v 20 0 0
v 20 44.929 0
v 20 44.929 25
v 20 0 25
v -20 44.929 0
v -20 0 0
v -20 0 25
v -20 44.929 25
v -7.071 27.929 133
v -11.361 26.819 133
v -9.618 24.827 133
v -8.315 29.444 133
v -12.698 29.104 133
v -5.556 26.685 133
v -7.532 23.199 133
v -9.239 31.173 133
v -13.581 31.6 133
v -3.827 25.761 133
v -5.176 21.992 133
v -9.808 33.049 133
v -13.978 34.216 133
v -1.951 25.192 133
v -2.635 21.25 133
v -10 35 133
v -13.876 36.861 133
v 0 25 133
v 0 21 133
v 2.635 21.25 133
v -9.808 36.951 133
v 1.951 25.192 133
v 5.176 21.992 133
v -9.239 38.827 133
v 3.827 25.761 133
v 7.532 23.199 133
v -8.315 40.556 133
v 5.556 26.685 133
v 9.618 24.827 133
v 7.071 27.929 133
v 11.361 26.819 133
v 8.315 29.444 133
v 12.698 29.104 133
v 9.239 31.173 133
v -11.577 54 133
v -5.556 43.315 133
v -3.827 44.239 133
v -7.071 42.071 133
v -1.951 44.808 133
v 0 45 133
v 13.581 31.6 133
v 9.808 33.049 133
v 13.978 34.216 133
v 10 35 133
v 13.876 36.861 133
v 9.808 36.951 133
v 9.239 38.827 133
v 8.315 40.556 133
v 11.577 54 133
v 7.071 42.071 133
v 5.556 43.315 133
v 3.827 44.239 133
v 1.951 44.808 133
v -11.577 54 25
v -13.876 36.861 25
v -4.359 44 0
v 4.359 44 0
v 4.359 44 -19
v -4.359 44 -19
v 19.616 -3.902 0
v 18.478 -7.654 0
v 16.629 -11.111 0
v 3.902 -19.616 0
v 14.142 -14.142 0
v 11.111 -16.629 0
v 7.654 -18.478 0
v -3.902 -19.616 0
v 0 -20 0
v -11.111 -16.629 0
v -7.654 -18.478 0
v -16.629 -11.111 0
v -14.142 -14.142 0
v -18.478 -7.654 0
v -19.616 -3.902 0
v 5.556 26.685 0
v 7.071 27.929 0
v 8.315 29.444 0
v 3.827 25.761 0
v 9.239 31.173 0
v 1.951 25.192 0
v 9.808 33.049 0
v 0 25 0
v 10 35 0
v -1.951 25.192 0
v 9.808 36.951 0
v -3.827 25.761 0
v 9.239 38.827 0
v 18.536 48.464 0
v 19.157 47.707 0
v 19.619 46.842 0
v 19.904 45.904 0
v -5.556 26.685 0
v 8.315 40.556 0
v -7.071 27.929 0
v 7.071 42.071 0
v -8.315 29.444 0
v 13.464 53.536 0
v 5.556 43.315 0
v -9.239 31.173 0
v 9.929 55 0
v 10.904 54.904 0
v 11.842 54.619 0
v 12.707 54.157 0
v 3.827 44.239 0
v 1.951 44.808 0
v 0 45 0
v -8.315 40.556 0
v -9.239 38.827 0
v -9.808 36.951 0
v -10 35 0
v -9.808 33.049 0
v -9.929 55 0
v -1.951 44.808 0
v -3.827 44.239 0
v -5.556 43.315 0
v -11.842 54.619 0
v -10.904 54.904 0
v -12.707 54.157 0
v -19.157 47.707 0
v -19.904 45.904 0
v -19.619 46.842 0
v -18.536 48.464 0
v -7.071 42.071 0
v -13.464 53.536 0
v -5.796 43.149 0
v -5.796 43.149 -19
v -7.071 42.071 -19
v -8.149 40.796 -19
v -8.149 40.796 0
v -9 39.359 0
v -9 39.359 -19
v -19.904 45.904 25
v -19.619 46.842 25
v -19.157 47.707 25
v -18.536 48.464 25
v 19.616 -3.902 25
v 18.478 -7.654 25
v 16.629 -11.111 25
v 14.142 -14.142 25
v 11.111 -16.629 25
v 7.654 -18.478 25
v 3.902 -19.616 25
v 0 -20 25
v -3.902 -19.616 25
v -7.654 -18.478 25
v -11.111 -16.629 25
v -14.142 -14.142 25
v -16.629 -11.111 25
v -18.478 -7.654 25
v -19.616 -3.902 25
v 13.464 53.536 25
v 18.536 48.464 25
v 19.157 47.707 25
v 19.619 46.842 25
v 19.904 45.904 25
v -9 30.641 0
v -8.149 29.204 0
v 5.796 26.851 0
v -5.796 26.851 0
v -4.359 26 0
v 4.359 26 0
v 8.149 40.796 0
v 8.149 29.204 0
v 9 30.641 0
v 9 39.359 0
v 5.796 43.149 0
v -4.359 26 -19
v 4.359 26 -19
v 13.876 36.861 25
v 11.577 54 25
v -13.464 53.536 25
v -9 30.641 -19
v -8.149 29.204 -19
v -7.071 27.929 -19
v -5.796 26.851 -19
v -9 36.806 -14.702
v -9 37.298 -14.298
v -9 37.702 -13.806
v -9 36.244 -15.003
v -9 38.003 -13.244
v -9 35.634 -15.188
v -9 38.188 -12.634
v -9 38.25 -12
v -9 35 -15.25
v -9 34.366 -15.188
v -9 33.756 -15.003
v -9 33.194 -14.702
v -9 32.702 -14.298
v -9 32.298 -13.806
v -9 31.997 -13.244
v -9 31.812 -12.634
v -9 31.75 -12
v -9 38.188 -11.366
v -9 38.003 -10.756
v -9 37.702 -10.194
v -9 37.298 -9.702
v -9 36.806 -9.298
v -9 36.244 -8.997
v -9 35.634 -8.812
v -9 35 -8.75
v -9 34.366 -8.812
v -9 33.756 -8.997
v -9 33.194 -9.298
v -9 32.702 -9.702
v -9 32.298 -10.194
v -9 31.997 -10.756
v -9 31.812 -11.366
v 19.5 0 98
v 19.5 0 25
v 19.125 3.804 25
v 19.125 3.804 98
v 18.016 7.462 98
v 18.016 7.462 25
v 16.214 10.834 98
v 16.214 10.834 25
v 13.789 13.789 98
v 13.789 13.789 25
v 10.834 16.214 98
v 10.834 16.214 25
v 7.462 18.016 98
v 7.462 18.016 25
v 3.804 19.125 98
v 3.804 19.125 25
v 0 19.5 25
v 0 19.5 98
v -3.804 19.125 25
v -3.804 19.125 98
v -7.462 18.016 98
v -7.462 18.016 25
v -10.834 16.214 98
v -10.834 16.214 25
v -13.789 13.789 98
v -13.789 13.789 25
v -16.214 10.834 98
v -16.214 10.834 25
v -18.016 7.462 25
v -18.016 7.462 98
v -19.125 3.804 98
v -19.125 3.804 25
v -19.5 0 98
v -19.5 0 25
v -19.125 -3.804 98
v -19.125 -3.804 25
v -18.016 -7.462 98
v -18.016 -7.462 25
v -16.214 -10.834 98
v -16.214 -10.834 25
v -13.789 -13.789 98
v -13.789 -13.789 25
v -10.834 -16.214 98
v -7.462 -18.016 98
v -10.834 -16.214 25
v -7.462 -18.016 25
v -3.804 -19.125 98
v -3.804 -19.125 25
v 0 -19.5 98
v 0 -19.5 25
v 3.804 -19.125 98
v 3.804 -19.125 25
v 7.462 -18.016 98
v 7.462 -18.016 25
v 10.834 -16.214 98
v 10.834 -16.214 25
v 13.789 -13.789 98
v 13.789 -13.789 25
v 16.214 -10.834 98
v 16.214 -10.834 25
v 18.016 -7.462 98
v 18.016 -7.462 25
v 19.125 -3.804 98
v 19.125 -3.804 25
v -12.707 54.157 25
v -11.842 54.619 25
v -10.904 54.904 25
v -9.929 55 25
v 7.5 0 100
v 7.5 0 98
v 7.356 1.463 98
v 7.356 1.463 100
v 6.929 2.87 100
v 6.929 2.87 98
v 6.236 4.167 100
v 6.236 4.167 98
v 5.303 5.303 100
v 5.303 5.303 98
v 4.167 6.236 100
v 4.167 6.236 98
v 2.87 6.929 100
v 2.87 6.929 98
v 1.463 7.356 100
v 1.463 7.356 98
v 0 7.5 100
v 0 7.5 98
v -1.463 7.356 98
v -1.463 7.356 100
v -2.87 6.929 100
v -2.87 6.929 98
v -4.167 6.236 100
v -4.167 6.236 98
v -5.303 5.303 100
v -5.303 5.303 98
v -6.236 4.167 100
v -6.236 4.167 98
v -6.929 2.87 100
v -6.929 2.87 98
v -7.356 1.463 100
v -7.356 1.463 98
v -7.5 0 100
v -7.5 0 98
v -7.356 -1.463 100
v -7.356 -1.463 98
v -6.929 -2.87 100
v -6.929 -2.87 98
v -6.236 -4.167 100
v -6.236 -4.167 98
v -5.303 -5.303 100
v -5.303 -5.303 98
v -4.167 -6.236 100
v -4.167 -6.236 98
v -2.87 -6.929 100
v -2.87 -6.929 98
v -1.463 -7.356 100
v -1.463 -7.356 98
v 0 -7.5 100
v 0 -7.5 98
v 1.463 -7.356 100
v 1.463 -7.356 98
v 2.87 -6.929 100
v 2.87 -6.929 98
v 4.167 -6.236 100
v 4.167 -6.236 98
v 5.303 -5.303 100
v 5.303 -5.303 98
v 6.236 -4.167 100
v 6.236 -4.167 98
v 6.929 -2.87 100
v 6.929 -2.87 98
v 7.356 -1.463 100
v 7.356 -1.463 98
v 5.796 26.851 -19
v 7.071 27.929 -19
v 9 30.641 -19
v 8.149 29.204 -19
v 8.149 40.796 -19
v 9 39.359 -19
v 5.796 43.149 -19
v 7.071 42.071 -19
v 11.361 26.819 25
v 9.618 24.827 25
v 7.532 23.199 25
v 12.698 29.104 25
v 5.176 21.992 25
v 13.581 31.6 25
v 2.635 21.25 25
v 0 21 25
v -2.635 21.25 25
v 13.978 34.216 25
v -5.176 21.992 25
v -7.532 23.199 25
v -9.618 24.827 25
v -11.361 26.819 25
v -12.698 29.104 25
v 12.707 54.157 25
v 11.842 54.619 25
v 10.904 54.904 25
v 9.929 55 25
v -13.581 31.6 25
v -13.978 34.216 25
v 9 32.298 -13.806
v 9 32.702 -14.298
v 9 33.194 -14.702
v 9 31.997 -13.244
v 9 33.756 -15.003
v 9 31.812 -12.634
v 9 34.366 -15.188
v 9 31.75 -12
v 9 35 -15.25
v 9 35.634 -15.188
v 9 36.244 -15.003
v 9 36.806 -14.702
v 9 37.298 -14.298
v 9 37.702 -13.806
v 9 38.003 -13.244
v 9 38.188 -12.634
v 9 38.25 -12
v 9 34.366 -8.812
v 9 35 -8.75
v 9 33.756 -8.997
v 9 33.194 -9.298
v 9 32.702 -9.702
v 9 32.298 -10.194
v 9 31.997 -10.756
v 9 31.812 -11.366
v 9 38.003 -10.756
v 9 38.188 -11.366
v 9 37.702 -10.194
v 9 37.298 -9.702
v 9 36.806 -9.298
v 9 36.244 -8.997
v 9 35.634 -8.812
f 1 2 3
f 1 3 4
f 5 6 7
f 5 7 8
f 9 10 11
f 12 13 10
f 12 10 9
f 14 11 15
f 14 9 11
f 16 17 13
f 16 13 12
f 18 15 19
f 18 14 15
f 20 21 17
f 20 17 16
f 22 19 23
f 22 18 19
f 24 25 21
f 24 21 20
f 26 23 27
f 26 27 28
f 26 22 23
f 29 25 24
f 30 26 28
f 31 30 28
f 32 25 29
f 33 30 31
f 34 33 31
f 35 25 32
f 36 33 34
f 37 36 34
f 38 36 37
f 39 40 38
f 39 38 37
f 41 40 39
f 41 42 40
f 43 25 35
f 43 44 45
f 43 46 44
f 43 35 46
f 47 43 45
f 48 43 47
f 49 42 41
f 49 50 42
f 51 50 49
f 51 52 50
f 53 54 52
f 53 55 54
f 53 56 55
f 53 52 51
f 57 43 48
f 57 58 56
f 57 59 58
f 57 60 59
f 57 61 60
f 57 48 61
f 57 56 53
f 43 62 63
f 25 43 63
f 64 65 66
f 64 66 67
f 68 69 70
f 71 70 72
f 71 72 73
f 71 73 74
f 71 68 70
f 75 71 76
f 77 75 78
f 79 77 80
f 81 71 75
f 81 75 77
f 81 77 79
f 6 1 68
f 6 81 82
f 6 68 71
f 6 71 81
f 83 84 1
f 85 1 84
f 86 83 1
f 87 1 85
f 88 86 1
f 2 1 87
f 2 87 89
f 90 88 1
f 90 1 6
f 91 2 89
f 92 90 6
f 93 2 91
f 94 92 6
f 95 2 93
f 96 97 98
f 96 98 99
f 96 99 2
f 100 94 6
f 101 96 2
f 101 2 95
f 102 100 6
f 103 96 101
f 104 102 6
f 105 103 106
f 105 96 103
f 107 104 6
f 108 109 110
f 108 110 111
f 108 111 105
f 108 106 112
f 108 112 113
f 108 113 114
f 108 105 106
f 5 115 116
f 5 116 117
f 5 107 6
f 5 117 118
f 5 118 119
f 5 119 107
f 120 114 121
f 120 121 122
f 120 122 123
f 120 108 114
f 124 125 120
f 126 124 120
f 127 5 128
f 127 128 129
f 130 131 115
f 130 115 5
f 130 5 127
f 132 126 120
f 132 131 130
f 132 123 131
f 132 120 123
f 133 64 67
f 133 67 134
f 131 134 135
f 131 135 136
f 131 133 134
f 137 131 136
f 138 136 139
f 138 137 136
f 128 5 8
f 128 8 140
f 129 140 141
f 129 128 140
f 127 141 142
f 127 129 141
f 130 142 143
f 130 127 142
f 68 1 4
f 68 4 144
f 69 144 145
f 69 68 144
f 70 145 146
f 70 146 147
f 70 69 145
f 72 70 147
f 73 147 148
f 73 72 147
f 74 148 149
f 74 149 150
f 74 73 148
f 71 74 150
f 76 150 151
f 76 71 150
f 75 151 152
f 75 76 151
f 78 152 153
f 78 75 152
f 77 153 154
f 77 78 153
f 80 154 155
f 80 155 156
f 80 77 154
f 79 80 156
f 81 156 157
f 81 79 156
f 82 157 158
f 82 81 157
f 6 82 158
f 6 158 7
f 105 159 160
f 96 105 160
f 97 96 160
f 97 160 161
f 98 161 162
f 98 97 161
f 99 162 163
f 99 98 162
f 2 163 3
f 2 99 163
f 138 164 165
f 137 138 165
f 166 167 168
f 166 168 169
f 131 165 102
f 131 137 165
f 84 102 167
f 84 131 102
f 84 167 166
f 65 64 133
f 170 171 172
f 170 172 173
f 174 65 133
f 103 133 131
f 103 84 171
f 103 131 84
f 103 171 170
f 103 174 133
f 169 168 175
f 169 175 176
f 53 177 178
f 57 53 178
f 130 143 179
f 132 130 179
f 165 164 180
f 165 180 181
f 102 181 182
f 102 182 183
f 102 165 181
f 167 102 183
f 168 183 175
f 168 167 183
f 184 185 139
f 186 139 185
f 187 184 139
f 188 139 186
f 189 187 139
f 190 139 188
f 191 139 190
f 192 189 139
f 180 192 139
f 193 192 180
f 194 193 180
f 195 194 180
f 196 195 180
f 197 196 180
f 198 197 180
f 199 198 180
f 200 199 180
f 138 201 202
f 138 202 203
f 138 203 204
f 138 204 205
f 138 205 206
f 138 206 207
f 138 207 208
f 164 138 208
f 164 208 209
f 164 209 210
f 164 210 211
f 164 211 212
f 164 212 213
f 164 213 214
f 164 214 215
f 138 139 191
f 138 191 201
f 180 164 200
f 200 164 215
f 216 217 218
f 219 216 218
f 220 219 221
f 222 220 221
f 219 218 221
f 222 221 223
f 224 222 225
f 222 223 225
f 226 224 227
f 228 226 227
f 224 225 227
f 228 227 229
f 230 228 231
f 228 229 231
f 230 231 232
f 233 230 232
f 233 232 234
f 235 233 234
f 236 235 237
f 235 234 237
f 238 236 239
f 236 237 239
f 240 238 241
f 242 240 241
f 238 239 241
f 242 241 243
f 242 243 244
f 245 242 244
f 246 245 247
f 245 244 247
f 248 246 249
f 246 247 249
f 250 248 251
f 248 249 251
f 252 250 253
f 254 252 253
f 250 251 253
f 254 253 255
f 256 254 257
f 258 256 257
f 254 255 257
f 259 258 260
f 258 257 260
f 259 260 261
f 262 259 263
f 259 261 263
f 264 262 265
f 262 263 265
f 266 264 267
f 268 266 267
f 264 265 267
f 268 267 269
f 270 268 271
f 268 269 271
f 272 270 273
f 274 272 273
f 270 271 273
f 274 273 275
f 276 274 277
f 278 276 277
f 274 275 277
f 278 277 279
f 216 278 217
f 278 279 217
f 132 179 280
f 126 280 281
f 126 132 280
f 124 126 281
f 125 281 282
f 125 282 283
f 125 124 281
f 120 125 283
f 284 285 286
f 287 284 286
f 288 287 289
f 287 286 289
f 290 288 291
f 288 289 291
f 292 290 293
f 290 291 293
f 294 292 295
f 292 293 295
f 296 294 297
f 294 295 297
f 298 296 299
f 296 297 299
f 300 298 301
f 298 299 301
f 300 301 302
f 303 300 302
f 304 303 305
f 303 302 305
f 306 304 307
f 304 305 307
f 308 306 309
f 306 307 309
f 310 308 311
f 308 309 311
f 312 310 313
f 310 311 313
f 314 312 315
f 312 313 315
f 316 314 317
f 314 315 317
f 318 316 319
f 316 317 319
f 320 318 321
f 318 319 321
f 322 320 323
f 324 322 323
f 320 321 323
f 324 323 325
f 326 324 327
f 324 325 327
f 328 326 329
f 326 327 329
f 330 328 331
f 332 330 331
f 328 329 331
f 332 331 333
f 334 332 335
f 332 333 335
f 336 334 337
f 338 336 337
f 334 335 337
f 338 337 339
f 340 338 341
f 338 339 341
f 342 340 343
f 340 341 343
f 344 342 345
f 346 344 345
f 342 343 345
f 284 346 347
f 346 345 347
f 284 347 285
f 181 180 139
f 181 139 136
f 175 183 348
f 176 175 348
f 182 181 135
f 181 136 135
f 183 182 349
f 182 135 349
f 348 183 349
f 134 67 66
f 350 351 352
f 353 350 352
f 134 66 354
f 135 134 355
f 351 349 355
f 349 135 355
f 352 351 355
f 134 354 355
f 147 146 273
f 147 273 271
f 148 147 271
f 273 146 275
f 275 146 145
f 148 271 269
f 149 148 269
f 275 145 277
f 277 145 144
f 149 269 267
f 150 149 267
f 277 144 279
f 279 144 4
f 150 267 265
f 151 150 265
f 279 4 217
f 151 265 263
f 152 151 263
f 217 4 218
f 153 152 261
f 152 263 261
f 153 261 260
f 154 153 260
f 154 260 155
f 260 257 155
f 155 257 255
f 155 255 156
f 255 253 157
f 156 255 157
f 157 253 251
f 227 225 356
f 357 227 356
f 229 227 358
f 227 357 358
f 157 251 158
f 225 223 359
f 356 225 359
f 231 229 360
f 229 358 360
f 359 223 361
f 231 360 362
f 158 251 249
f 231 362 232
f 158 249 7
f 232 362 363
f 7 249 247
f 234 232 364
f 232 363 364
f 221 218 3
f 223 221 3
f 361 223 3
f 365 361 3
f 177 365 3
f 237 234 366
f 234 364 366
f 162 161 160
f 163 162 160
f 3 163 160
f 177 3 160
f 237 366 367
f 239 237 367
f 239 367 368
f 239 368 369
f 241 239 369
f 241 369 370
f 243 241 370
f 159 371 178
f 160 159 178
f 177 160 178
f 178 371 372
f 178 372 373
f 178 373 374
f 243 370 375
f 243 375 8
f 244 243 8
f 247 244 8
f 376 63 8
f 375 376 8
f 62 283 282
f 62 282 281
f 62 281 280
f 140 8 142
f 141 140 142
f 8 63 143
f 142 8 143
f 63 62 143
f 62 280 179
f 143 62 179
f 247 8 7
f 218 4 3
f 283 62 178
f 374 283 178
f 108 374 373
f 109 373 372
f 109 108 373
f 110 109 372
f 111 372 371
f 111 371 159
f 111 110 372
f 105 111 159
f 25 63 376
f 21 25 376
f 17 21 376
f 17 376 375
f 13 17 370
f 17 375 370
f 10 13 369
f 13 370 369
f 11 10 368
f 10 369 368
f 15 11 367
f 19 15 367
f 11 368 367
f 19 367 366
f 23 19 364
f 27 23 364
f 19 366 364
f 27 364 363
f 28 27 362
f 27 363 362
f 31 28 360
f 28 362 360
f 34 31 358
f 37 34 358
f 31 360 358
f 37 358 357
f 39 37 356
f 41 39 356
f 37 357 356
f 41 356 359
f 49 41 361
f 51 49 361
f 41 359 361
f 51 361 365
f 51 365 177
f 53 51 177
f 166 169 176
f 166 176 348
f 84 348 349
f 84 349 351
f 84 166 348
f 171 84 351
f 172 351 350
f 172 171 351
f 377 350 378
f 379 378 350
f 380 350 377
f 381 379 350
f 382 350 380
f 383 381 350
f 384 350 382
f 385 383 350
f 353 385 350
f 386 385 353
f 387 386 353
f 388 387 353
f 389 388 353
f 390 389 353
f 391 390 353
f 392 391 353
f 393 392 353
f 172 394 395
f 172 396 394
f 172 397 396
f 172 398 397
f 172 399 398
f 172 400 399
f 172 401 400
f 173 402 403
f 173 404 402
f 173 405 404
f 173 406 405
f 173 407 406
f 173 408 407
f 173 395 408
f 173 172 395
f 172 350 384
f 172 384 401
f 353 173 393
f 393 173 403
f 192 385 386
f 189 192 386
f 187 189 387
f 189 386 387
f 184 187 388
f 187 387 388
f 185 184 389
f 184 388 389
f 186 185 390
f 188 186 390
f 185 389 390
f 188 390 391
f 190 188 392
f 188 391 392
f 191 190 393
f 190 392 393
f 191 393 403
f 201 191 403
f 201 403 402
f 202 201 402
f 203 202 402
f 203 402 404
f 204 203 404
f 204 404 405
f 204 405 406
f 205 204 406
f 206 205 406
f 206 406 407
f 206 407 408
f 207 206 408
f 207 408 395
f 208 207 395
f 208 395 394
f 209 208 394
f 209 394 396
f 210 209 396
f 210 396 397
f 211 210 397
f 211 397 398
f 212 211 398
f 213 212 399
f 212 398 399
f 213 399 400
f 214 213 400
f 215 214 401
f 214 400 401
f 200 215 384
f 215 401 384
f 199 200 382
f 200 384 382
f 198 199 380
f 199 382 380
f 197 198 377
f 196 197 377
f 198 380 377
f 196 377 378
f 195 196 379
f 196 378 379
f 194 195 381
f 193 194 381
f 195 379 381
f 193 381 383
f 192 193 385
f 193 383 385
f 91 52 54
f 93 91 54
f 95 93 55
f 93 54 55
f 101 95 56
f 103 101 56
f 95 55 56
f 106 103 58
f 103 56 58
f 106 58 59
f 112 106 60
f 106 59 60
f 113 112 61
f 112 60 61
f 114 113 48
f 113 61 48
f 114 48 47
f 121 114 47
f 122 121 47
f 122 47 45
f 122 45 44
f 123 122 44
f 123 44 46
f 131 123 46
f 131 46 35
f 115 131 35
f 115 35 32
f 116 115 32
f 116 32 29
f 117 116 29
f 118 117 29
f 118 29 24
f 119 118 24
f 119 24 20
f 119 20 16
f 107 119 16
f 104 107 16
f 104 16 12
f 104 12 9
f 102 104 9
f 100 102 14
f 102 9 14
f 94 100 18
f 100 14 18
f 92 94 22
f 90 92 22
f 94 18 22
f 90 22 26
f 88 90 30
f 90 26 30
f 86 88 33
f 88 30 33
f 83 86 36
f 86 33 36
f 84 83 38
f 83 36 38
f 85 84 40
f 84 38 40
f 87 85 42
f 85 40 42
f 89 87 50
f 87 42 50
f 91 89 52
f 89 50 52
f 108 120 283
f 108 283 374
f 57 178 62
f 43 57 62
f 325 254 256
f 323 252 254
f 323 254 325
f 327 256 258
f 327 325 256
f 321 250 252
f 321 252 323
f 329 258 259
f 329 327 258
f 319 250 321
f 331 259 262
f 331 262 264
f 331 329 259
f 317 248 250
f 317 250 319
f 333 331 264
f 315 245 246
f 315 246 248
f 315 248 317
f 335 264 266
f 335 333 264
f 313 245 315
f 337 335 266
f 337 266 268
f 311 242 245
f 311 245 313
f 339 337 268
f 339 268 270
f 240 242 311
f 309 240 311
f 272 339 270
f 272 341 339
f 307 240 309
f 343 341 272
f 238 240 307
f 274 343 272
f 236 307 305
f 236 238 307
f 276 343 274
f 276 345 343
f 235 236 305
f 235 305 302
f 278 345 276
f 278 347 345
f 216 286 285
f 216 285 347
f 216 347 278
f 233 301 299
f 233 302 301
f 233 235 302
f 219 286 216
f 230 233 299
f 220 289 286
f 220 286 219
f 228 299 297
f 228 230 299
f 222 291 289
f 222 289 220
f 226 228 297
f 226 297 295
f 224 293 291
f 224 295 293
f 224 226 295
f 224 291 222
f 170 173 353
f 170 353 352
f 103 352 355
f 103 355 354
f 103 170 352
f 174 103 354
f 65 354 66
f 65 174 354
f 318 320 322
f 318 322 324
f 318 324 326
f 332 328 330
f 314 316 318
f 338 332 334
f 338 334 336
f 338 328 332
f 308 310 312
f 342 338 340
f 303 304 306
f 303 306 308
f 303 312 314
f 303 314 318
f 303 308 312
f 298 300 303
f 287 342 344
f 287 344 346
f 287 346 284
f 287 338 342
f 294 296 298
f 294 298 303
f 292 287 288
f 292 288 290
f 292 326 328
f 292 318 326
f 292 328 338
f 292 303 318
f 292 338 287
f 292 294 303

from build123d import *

# Parameters (mm, degrees)
EXTRUDE_1_DEPTH     = 25
SKETCH_2_R          = 19.5
EXTRUDE_2_DEPTH     = 73
SKETCH_3_R          = 7.5
EXTRUDE_3_DEPTH     = 2
EXTRUDE_4_DEPTH     = 108
SKETCH_5_R          = 10
CUT_EXTRUDE_1_DEPTH = 410
EXTRUDE_5_DEPTH     = 19
SKETCH_7_R          = 3.25
CUT_EXTRUDE_2_DEPTH = 94


with BuildPart() as part:
    # 草图1 → 凸台-拉伸1 (new body)
    with BuildSketch(Plane.XY):
        with BuildLine():
            Line((-20, 0), (-20, 44.928932188))
            ThreePointArc((-20, 44.928932188), (-19.619397663, 46.84234935), (-18.535533906, 48.464466094))
            Line((-18.535533906, 48.464466094), (-13.464466094, 53.535533906))
            ThreePointArc((-13.464466094, 53.535533906), (-11.84234935, 54.619397663), (-9.928932188, 55))
            Line((-9.928932188, 55), (9.928932188, 55))
            ThreePointArc((9.928932188, 55), (11.84234935, 54.619397663), (13.464466094, 53.535533906))
            Line((13.464466094, 53.535533906), (18.535533906, 48.464466094))
            ThreePointArc((18.535533906, 48.464466094), (19.619397663, 46.84234935), (20, 44.928932188))
            Line((20, 44.928932188), (20, 0))
            ThreePointArc((20, 0), (0, -20), (-20, 0))
        make_face()
    extrude(amount=EXTRUDE_1_DEPTH)

    # 草图2 → 凸台-拉伸2 (add)
    with BuildSketch(Plane.XY.offset(25)):
        Circle(SKETCH_2_R)
    extrude(amount=EXTRUDE_2_DEPTH)

    # 草图3 → 凸台-拉伸3 (add)
    with BuildSketch(Plane.XY.offset(98)):
        Circle(SKETCH_3_R)
    extrude(amount=EXTRUDE_3_DEPTH)

    # 草图4 → 凸台-拉伸4 (add)
    with BuildSketch(Plane.XY.offset(25)):
        with BuildLine():
            Line((-11.576521962, 54), (-13.87569737, 36.861457087))
            ThreePointArc((-13.87569737, 36.861457087), (0, 21), (13.87569737, 36.861457087))
            Line((13.87569737, 36.861457087), (11.576521962, 54))
            Line((11.576521962, 54), (-11.576521962, 54))
        make_face()
    extrude(amount=EXTRUDE_4_DEPTH)

    # 草图5 → 切除-拉伸1 (cut)
    with BuildSketch(Plane.XY.offset(133)):
        with Locations((0, 35)):
            Circle(SKETCH_5_R)
    extrude(amount=-CUT_EXTRUDE_1_DEPTH, mode=Mode.SUBTRACT)


with BuildPart() as body_2:
    # 草图6 → 凸台-拉伸5 (new body)
    with BuildSketch(Plane(origin=(0, 0, 0), x_dir=(-1, 0, 0), z_dir=(0, 0, -1))):
        with BuildLine():
            Line((-4.358898944, 44), (4.358898944, 44))
            ThreePointArc((4.358898944, 44), (7.071067812, 42.071067812), (9, 39.358898944))
            Line((9, 39.358898944), (9, 30.641101056))
            ThreePointArc((9, 30.641101056), (7.071067812, 27.928932188), (4.358898944, 26))
            Line((4.358898944, 26), (-4.358898944, 26))
            ThreePointArc((-4.358898944, 26), (-7.071067812, 27.928932188), (-9, 30.641101056))
            Line((-9, 30.641101056), (-9, 39.358898944))
            ThreePointArc((-9, 39.358898944), (-7.071067812, 42.071067812), (-4.358898944, 44))
        make_face()
    extrude(amount=EXTRUDE_5_DEPTH)

    # 草图7 → 切除-拉伸2 (cut)
    with BuildSketch(Plane(origin=(9, 0, 0), x_dir=(0, 0, -1), z_dir=(1, 0, 0))):
        with Locations((12, 35)):
            Circle(SKETCH_7_R)
    extrude(amount=-CUT_EXTRUDE_2_DEPTH, mode=Mode.SUBTRACT)


solid = Compound([part.part, body_2.part])
